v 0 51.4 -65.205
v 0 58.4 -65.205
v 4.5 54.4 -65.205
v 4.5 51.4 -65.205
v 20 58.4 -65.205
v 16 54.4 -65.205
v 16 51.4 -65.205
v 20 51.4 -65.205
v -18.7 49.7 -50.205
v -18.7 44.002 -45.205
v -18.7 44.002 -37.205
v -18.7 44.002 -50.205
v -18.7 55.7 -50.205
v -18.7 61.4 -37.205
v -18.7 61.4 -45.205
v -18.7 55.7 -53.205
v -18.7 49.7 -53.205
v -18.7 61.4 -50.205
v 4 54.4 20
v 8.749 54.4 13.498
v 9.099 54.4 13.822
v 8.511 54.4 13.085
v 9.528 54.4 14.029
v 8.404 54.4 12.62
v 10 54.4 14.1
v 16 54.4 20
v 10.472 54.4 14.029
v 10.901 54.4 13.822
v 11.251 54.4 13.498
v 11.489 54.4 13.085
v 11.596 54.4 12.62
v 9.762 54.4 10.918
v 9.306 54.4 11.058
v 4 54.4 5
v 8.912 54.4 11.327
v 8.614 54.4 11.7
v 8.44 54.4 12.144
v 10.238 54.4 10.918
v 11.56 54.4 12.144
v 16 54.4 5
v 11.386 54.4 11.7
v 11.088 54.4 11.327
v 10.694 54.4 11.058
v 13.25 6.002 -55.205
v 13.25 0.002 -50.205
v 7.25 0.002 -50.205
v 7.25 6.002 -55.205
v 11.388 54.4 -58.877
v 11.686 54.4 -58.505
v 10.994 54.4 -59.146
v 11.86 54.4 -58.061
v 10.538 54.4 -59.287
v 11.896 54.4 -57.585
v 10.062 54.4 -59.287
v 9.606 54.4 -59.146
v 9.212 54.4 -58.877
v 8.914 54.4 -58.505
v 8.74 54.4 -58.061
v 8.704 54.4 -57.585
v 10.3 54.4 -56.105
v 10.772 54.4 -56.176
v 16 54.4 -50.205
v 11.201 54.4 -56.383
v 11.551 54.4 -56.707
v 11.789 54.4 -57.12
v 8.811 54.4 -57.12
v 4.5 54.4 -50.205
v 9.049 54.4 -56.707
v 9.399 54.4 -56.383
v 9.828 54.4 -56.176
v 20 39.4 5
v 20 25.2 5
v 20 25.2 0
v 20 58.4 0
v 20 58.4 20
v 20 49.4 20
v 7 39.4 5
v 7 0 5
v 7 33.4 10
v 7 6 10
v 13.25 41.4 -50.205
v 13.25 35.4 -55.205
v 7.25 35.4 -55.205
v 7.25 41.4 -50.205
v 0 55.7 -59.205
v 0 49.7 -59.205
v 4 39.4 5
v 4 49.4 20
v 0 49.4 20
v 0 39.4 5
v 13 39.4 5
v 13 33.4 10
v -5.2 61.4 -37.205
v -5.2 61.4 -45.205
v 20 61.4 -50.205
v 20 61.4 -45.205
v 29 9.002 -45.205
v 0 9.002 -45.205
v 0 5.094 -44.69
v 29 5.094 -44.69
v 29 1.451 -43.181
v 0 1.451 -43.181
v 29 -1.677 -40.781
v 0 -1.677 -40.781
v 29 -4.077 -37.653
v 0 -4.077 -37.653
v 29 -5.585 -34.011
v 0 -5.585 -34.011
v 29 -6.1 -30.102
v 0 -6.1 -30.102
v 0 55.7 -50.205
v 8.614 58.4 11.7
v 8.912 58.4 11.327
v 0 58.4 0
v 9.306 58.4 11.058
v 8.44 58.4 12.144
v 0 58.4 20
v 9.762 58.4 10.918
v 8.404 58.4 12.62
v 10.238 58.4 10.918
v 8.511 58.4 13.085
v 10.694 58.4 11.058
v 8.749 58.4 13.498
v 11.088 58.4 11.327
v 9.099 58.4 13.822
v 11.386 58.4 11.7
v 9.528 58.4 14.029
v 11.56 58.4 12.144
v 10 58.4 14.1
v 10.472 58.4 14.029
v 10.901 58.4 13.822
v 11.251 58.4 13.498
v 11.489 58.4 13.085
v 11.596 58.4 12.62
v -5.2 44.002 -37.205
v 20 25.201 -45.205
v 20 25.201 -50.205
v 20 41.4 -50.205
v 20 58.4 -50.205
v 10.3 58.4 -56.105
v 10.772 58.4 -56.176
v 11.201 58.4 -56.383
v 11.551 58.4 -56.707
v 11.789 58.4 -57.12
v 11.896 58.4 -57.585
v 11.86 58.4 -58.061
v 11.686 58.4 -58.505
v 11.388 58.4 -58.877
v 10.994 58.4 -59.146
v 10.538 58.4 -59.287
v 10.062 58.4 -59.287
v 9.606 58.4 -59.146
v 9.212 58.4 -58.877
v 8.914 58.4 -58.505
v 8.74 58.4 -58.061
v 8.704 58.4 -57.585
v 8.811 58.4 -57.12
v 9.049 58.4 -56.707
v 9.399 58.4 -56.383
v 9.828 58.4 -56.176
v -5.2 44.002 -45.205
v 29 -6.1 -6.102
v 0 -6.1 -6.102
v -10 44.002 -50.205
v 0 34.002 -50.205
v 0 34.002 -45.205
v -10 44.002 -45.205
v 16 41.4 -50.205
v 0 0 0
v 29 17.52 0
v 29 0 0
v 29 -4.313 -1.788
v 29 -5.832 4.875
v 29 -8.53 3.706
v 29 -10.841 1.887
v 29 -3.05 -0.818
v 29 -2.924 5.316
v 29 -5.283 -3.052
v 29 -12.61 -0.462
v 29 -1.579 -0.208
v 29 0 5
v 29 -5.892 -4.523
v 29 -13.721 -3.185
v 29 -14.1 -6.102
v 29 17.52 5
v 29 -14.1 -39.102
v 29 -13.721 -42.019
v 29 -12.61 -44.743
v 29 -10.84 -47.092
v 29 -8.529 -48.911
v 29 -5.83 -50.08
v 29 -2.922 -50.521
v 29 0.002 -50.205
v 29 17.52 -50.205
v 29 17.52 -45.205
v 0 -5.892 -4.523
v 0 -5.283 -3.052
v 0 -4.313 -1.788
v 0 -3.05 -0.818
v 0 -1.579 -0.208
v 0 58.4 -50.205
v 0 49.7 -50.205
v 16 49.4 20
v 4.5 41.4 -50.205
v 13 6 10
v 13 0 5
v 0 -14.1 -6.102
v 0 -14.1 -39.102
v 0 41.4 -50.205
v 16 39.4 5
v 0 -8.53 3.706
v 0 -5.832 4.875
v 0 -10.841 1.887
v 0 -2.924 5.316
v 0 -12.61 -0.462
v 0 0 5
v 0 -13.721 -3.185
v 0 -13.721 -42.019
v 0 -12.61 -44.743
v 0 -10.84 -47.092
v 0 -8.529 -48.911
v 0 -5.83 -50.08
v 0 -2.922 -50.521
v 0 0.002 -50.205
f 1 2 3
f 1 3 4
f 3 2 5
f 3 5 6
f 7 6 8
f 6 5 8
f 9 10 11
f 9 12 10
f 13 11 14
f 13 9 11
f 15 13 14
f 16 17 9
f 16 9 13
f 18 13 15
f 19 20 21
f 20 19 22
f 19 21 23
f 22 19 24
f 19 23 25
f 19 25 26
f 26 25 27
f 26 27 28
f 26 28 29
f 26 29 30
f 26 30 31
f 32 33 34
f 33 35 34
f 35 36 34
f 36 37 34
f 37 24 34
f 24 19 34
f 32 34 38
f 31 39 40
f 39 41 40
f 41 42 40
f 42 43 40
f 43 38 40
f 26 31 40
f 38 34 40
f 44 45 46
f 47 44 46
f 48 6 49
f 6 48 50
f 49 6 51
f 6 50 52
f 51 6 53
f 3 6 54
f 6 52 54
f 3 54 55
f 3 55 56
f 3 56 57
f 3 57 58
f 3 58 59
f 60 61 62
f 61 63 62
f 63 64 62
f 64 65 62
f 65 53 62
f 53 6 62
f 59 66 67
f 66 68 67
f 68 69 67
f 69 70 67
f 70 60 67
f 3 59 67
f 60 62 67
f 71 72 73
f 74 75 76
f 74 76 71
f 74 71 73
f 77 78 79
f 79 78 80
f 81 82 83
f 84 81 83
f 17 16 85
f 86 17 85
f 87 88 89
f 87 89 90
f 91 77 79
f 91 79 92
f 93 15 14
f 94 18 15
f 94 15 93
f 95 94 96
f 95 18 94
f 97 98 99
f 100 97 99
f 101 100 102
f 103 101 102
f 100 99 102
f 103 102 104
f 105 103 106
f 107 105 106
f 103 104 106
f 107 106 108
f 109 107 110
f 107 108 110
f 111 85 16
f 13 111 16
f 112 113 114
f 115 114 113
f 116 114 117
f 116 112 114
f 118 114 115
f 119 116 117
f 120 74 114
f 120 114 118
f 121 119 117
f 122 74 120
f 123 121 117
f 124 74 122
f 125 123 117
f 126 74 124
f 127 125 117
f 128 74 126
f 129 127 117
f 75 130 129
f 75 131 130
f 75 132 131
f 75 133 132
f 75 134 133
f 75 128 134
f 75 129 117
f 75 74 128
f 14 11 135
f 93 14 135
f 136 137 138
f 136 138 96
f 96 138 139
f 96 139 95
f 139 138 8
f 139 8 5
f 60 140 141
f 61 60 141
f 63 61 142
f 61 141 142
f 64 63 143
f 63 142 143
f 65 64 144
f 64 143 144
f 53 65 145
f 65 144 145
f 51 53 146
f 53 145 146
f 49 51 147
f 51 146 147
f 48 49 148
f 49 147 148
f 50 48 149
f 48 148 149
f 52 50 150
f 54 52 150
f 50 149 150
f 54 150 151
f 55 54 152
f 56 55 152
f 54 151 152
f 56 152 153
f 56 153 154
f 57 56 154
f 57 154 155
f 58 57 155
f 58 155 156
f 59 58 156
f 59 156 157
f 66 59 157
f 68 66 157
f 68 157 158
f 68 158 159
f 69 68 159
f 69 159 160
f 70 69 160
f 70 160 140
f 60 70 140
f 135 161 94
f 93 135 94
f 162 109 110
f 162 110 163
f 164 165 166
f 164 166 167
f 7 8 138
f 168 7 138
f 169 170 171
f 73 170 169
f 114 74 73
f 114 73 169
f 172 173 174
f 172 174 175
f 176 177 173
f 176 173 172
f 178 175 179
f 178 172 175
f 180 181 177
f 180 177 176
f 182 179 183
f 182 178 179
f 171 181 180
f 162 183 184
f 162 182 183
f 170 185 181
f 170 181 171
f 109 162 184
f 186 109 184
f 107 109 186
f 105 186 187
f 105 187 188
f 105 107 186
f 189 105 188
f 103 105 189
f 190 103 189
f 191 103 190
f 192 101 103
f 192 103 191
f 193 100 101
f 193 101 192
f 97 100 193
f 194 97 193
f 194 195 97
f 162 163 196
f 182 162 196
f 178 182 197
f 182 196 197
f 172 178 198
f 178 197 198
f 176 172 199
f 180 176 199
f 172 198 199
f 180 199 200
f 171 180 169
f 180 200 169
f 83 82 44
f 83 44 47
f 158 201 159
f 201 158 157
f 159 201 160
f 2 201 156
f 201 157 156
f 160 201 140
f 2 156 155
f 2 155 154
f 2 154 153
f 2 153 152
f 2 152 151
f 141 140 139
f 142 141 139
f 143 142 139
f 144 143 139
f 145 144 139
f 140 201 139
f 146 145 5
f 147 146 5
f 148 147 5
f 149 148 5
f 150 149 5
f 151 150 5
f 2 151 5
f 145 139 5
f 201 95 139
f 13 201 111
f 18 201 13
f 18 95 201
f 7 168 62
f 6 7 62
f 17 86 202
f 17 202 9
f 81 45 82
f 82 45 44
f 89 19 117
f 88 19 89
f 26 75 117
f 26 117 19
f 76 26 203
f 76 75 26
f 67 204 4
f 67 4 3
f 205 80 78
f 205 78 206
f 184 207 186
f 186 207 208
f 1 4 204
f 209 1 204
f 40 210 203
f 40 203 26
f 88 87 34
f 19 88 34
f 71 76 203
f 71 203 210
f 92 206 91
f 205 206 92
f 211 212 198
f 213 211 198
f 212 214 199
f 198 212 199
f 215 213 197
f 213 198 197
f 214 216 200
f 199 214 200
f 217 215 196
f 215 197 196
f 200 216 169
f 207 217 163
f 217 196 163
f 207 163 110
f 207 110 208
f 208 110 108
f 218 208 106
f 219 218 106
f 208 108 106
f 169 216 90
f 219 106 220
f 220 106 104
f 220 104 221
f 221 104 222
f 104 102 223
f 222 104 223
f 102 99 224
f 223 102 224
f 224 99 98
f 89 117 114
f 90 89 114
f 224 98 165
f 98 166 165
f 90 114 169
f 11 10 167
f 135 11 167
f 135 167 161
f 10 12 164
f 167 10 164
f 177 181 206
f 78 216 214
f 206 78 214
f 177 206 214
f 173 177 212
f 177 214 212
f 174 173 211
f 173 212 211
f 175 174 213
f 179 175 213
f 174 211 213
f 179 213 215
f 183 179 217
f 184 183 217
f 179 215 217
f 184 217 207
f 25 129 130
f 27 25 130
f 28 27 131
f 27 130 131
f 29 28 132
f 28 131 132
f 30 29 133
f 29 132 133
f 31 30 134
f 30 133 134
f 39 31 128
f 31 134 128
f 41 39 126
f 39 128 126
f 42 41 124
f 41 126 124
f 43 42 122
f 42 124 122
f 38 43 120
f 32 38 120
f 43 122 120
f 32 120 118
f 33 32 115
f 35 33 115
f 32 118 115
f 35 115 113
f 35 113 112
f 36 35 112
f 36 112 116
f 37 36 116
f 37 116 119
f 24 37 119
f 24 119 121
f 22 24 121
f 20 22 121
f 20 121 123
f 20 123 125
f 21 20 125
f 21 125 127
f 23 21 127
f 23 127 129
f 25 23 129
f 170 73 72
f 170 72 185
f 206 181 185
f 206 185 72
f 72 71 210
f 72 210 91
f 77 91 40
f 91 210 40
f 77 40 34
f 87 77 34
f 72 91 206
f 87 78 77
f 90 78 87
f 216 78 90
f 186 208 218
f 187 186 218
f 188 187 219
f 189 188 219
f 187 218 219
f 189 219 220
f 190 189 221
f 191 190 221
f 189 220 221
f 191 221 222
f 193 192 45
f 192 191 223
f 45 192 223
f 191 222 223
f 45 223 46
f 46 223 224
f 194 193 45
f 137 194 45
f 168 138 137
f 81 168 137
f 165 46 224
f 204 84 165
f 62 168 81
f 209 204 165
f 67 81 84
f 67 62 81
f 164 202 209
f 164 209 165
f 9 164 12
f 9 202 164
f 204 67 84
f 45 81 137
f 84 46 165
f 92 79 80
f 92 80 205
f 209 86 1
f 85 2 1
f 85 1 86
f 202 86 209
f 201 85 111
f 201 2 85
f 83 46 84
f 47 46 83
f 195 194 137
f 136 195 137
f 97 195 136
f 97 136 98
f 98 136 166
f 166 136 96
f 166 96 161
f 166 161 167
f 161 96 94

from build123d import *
from OCP.BRepFilletAPI import BRepFilletAPI_MakeChamfer

# Parameters (mm, degrees)
RESSALTO_EXTRUS_O1_DEPTH = 5
RESSALTO_EXTRUS_O2_DEPTH = 29
CORTE_EXTRUS_O1_REACH    = 89.714
RESSALTO_EXTRUS_O3_DEPTH = 5
ESBO_O5_W                = 13.5
ESBO_O5_H                = 17.397720337
RESSALTO_EXTRUS_O4_DEPTH = 8
RESSALTO_EXTRUS_O5_DEPTH = 20
ESBO_O7_W                = 11.5
ESBO_O7_H                = 13
CORTE_EXTRUS_O2_DEPTH    = 20
RESSALTO_EXTRUS_O6_DEPTH = 20
ESBO_O9_W                = 12
ESBO_O9_H                = 15
CORTE_EXTRUS_O3_DEPTH    = 20
ESBO_O11_W               = 6
ESBO_O11_H               = 39.4
RESSALTO_EXTRUS_O7_DEPTH = 5
ESBO_O12_W               = 6
ESBO_O12_H               = 41.397720337
RESSALTO_EXTRUS_O8_DEPTH = 5
CHANFRO1_SIZE            = 5
CHANFRO1_SIZE_2          = 6
RESSALTO_EXTRUS_O9_START = -5.7
RESSALTO_EXTRUS_O9_DEPTH = 6
ESBO_O14_R               = 1.6
CORTE_EXTRUS_O4_DEPTH    = 6


with BuildPart() as part:
    # Esboço1 → Ressalto-extrusão1 (new body)
    with BuildSketch(Plane.XY):
        Polygon((0, 0), (0, 58.4), (20, 58.4), (20, 25.2), (29, 17.52), (29, 0), align=None)
    extrude(amount=RESSALTO_EXTRUS_O1_DEPTH)

    # Esboço2 → Ressalto-extrusão2 (add)
    with BuildSketch(Plane.ZY):
        with BuildLine():
            Line((0, 0), (5, 0))
            ThreePointArc((5, 0), (2.871117767, -9.744454942), (-6.101940178, -14.1))
            Line((-6.101940178, -14.1), (-39.10228157, -14.1))
            ThreePointArc((-39.10228157, -14.1), (-48.076340899, -9.74361665), (-50.204561234, 0.002279663))
            Line((-50.204561234, 0.002279663), (-50.204561234, 61.4))
            Line((-50.204561234, 61.4), (-45.204561234, 61.4))
            Line((-45.204561234, 61.4), (-45.204561234, 9.002278982))
            ThreePointArc((-45.204561234, 9.002278982), (-40.78120589, -1.676645138), (-30.10228157, -6.1))
            Line((-30.10228157, -6.1), (-6.102283186, -6.1))
            ThreePointArc((-6.102283186, -6.1), (-1.788124517, -4.313489814), (0, 0))
        make_face()
    extrude(amount=-RESSALTO_EXTRUS_O2_DEPTH)

    # Esboço3 → Corte-extrusão1 (cut, up to next)
    with BuildSketch(Plane(origin=(0, 0, -50.204561234), x_dir=(-1, 0, 0), z_dir=(0, 0, -1)), mode=Mode.PRIVATE) as corte_extrus_o1_sk1:
        Polygon((-29, 17.52), (-20, 25.201139832), (-20, 61.4), (-29, 61.4), align=None)
    corte_extrus_o1_tool1 = extrude(corte_extrus_o1_sk1.sketch, amount=-CORTE_EXTRUS_O1_REACH, mode=Mode.PRIVATE) & part.part
    add(corte_extrus_o1_tool1.solids().sort_by_distance((24.64388, 41.318887, -50.204561))[0], mode=Mode.SUBTRACT)

    # Esboço4 → Ressalto-extrusão3 (add)
    with BuildSketch(Plane(origin=(0, 0, -50.204561234), x_dir=(-1, 0, 0), z_dir=(0, 0, -1))):
        Polygon((0, 34.002279663), (9.999992371, 44.002279663), (18.699996948, 44.002279663), (18.699996948, 61.4), (0, 61.4), align=None)
    extrude(amount=-RESSALTO_EXTRUS_O3_DEPTH)

    # Esboço5 → Ressalto-extrusão4 (add)
    with BuildSketch(Plane.XY.offset(-45.204561234)):
        with Locations((-11.949996948, 52.701139832)):
            Rectangle(ESBO_O5_W, ESBO_O5_H)
    extrude(amount=RESSALTO_EXTRUS_O4_DEPTH)

    # Esboço6 → Ressalto-extrusão5 (add)
    with BuildSketch(Plane(origin=(20, 0, 0), x_dir=(0, 0, -1), z_dir=(1, 0, 0))):
        Polygon((50.204561234, 58.4), (65.204561234, 58.4), (65.204561234, 51.4), (50.204561234, 41.4), align=None)
    extrude(amount=-RESSALTO_EXTRUS_O5_DEPTH)

    # Esboço7 → Corte-extrusão2 (cut)
    with BuildSketch(Plane(origin=(0, 0, -50.204561234), x_dir=(-1, 0, 0), z_dir=(0, 0, -1))):
        with Locations((-10.25, 47.9)):
            Rectangle(ESBO_O7_W, ESBO_O7_H)
    extrude(amount=CORTE_EXTRUS_O2_DEPTH, mode=Mode.SUBTRACT)

    # Esboço8 → Ressalto-extrusão6 (add)
    with BuildSketch(Plane(origin=(20, 0, 0), x_dir=(0, 0, -1), z_dir=(1, 0, 0))):
        Polygon((-5, 58.4), (-19.999999523, 58.4), (-19.999999523, 49.4), (-5, 39.4), align=None)
    extrude(amount=-RESSALTO_EXTRUS_O6_DEPTH)

    # Esboço9 → Corte-extrusão3 (cut)
    with BuildSketch(Plane.XY.offset(5)):
        with Locations((10, 46.9)):
            Rectangle(ESBO_O9_W, ESBO_O9_H)
    extrude(amount=CORTE_EXTRUS_O3_DEPTH, mode=Mode.SUBTRACT)

    # Esboço11 → Ressalto-extrusão7 (add)
    with BuildSketch(Plane.XY.offset(5)):
        with Locations((10, 19.7)):
            Rectangle(ESBO_O11_W, ESBO_O11_H)
    extrude(amount=RESSALTO_EXTRUS_O7_DEPTH)

    # Esboço12 → Ressalto-extrusão8 (add)
    with BuildSketch(Plane(origin=(0, 0, -50.204561234), x_dir=(-1, 0, 0), z_dir=(0, 0, -1))):
        with Locations((-10.25, 20.701139832)):
            Rectangle(ESBO_O12_W, ESBO_O12_H)
    extrude(amount=RESSALTO_EXTRUS_O8_DEPTH)

    # Chanfro1
    chanfro1_edges_1 = [part.edges().sort_by_distance(p)[0] for p in [
        (10, 0, 10),
    ]]
    chanfro1_side_1 = [part.faces().sort_by_distance(p)[0] for p in [
        (10, 0, 9.9),
    ]]
    chanfro1_edges_2 = [part.edges().sort_by_distance(p)[0] for p in [
        (10, 39.4, 10),
    ]]
    chanfro1_side_2 = [part.faces().sort_by_distance(p)[0] for p in [
        (10, 39.4, 9.9),
    ]]
    chanfro1_edges_3 = [part.edges().sort_by_distance(p)[0] for p in [
        (10.25, 0.002279663, -55.204561234),
    ]]
    chanfro1_side_3 = [part.faces().sort_by_distance(p)[0] for p in [
        (10.25, 0.002279663, -55.104561234),
    ]]
    chanfro1_edges_4 = [part.edges().sort_by_distance(p)[0] for p in [
        (10.25, 41.4, -55.204561234),
    ]]
    chanfro1_side_4 = [part.faces().sort_by_distance(p)[0] for p in [
        (10.25, 41.4, -55.104561234),
    ]]
    chanfro1 = BRepFilletAPI_MakeChamfer(part.part.solid().wrapped)
    for e in chanfro1_edges_1:
        chanfro1.Add(CHANFRO1_SIZE - 0.0001, CHANFRO1_SIZE_2 - 0.0001, e.wrapped, chanfro1_side_1[0].wrapped)
    for e in chanfro1_edges_2:
        chanfro1.Add(CHANFRO1_SIZE - 0.0001, CHANFRO1_SIZE_2 - 0.0001, e.wrapped, chanfro1_side_2[0].wrapped)
    for e in chanfro1_edges_3:
        chanfro1.Add(CHANFRO1_SIZE - 0.0001, CHANFRO1_SIZE_2 - 0.0001, e.wrapped, chanfro1_side_3[0].wrapped)
    for e in chanfro1_edges_4:
        chanfro1.Add(CHANFRO1_SIZE - 0.0001, CHANFRO1_SIZE_2 - 0.0001, e.wrapped, chanfro1_side_4[0].wrapped)
    add(Compound.cast(chanfro1.Shape()), mode=Mode.REPLACE)  # a hair under: the kernel refuses the full size

    # Esboço13 → Ressalto-extrusão9 (add)
    with BuildSketch(Plane(origin=(0, 61.4, 0), x_dir=(1, 0, 0), z_dir=(0, 1, 0)).offset(RESSALTO_EXTRUS_O9_START)):
        Polygon((-18.699996948, 50.204561234), (-18.699996948, 53.204561234), (0, 59.204561234), (0, 50.204561234), align=None)
    extrude(amount=-RESSALTO_EXTRUS_O9_DEPTH)

    # Esboço14 → Corte-extrusão4 (cut)
    with BuildSketch(Plane(origin=(0, 58.4, 0), x_dir=(1, 0, 0), z_dir=(0, 1, 0))):
        with Locations(Location((10.3, 57.704561234, 0), (0, 0, 270))):
            Circle(ESBO_O14_R)
        with Locations(Location((10, -12.499999523, 0), (0, 0, 270))):
            Circle(ESBO_O14_R)
    extrude(amount=-CORTE_EXTRUS_O4_DEPTH, mode=Mode.SUBTRACT)


solid = part.part
